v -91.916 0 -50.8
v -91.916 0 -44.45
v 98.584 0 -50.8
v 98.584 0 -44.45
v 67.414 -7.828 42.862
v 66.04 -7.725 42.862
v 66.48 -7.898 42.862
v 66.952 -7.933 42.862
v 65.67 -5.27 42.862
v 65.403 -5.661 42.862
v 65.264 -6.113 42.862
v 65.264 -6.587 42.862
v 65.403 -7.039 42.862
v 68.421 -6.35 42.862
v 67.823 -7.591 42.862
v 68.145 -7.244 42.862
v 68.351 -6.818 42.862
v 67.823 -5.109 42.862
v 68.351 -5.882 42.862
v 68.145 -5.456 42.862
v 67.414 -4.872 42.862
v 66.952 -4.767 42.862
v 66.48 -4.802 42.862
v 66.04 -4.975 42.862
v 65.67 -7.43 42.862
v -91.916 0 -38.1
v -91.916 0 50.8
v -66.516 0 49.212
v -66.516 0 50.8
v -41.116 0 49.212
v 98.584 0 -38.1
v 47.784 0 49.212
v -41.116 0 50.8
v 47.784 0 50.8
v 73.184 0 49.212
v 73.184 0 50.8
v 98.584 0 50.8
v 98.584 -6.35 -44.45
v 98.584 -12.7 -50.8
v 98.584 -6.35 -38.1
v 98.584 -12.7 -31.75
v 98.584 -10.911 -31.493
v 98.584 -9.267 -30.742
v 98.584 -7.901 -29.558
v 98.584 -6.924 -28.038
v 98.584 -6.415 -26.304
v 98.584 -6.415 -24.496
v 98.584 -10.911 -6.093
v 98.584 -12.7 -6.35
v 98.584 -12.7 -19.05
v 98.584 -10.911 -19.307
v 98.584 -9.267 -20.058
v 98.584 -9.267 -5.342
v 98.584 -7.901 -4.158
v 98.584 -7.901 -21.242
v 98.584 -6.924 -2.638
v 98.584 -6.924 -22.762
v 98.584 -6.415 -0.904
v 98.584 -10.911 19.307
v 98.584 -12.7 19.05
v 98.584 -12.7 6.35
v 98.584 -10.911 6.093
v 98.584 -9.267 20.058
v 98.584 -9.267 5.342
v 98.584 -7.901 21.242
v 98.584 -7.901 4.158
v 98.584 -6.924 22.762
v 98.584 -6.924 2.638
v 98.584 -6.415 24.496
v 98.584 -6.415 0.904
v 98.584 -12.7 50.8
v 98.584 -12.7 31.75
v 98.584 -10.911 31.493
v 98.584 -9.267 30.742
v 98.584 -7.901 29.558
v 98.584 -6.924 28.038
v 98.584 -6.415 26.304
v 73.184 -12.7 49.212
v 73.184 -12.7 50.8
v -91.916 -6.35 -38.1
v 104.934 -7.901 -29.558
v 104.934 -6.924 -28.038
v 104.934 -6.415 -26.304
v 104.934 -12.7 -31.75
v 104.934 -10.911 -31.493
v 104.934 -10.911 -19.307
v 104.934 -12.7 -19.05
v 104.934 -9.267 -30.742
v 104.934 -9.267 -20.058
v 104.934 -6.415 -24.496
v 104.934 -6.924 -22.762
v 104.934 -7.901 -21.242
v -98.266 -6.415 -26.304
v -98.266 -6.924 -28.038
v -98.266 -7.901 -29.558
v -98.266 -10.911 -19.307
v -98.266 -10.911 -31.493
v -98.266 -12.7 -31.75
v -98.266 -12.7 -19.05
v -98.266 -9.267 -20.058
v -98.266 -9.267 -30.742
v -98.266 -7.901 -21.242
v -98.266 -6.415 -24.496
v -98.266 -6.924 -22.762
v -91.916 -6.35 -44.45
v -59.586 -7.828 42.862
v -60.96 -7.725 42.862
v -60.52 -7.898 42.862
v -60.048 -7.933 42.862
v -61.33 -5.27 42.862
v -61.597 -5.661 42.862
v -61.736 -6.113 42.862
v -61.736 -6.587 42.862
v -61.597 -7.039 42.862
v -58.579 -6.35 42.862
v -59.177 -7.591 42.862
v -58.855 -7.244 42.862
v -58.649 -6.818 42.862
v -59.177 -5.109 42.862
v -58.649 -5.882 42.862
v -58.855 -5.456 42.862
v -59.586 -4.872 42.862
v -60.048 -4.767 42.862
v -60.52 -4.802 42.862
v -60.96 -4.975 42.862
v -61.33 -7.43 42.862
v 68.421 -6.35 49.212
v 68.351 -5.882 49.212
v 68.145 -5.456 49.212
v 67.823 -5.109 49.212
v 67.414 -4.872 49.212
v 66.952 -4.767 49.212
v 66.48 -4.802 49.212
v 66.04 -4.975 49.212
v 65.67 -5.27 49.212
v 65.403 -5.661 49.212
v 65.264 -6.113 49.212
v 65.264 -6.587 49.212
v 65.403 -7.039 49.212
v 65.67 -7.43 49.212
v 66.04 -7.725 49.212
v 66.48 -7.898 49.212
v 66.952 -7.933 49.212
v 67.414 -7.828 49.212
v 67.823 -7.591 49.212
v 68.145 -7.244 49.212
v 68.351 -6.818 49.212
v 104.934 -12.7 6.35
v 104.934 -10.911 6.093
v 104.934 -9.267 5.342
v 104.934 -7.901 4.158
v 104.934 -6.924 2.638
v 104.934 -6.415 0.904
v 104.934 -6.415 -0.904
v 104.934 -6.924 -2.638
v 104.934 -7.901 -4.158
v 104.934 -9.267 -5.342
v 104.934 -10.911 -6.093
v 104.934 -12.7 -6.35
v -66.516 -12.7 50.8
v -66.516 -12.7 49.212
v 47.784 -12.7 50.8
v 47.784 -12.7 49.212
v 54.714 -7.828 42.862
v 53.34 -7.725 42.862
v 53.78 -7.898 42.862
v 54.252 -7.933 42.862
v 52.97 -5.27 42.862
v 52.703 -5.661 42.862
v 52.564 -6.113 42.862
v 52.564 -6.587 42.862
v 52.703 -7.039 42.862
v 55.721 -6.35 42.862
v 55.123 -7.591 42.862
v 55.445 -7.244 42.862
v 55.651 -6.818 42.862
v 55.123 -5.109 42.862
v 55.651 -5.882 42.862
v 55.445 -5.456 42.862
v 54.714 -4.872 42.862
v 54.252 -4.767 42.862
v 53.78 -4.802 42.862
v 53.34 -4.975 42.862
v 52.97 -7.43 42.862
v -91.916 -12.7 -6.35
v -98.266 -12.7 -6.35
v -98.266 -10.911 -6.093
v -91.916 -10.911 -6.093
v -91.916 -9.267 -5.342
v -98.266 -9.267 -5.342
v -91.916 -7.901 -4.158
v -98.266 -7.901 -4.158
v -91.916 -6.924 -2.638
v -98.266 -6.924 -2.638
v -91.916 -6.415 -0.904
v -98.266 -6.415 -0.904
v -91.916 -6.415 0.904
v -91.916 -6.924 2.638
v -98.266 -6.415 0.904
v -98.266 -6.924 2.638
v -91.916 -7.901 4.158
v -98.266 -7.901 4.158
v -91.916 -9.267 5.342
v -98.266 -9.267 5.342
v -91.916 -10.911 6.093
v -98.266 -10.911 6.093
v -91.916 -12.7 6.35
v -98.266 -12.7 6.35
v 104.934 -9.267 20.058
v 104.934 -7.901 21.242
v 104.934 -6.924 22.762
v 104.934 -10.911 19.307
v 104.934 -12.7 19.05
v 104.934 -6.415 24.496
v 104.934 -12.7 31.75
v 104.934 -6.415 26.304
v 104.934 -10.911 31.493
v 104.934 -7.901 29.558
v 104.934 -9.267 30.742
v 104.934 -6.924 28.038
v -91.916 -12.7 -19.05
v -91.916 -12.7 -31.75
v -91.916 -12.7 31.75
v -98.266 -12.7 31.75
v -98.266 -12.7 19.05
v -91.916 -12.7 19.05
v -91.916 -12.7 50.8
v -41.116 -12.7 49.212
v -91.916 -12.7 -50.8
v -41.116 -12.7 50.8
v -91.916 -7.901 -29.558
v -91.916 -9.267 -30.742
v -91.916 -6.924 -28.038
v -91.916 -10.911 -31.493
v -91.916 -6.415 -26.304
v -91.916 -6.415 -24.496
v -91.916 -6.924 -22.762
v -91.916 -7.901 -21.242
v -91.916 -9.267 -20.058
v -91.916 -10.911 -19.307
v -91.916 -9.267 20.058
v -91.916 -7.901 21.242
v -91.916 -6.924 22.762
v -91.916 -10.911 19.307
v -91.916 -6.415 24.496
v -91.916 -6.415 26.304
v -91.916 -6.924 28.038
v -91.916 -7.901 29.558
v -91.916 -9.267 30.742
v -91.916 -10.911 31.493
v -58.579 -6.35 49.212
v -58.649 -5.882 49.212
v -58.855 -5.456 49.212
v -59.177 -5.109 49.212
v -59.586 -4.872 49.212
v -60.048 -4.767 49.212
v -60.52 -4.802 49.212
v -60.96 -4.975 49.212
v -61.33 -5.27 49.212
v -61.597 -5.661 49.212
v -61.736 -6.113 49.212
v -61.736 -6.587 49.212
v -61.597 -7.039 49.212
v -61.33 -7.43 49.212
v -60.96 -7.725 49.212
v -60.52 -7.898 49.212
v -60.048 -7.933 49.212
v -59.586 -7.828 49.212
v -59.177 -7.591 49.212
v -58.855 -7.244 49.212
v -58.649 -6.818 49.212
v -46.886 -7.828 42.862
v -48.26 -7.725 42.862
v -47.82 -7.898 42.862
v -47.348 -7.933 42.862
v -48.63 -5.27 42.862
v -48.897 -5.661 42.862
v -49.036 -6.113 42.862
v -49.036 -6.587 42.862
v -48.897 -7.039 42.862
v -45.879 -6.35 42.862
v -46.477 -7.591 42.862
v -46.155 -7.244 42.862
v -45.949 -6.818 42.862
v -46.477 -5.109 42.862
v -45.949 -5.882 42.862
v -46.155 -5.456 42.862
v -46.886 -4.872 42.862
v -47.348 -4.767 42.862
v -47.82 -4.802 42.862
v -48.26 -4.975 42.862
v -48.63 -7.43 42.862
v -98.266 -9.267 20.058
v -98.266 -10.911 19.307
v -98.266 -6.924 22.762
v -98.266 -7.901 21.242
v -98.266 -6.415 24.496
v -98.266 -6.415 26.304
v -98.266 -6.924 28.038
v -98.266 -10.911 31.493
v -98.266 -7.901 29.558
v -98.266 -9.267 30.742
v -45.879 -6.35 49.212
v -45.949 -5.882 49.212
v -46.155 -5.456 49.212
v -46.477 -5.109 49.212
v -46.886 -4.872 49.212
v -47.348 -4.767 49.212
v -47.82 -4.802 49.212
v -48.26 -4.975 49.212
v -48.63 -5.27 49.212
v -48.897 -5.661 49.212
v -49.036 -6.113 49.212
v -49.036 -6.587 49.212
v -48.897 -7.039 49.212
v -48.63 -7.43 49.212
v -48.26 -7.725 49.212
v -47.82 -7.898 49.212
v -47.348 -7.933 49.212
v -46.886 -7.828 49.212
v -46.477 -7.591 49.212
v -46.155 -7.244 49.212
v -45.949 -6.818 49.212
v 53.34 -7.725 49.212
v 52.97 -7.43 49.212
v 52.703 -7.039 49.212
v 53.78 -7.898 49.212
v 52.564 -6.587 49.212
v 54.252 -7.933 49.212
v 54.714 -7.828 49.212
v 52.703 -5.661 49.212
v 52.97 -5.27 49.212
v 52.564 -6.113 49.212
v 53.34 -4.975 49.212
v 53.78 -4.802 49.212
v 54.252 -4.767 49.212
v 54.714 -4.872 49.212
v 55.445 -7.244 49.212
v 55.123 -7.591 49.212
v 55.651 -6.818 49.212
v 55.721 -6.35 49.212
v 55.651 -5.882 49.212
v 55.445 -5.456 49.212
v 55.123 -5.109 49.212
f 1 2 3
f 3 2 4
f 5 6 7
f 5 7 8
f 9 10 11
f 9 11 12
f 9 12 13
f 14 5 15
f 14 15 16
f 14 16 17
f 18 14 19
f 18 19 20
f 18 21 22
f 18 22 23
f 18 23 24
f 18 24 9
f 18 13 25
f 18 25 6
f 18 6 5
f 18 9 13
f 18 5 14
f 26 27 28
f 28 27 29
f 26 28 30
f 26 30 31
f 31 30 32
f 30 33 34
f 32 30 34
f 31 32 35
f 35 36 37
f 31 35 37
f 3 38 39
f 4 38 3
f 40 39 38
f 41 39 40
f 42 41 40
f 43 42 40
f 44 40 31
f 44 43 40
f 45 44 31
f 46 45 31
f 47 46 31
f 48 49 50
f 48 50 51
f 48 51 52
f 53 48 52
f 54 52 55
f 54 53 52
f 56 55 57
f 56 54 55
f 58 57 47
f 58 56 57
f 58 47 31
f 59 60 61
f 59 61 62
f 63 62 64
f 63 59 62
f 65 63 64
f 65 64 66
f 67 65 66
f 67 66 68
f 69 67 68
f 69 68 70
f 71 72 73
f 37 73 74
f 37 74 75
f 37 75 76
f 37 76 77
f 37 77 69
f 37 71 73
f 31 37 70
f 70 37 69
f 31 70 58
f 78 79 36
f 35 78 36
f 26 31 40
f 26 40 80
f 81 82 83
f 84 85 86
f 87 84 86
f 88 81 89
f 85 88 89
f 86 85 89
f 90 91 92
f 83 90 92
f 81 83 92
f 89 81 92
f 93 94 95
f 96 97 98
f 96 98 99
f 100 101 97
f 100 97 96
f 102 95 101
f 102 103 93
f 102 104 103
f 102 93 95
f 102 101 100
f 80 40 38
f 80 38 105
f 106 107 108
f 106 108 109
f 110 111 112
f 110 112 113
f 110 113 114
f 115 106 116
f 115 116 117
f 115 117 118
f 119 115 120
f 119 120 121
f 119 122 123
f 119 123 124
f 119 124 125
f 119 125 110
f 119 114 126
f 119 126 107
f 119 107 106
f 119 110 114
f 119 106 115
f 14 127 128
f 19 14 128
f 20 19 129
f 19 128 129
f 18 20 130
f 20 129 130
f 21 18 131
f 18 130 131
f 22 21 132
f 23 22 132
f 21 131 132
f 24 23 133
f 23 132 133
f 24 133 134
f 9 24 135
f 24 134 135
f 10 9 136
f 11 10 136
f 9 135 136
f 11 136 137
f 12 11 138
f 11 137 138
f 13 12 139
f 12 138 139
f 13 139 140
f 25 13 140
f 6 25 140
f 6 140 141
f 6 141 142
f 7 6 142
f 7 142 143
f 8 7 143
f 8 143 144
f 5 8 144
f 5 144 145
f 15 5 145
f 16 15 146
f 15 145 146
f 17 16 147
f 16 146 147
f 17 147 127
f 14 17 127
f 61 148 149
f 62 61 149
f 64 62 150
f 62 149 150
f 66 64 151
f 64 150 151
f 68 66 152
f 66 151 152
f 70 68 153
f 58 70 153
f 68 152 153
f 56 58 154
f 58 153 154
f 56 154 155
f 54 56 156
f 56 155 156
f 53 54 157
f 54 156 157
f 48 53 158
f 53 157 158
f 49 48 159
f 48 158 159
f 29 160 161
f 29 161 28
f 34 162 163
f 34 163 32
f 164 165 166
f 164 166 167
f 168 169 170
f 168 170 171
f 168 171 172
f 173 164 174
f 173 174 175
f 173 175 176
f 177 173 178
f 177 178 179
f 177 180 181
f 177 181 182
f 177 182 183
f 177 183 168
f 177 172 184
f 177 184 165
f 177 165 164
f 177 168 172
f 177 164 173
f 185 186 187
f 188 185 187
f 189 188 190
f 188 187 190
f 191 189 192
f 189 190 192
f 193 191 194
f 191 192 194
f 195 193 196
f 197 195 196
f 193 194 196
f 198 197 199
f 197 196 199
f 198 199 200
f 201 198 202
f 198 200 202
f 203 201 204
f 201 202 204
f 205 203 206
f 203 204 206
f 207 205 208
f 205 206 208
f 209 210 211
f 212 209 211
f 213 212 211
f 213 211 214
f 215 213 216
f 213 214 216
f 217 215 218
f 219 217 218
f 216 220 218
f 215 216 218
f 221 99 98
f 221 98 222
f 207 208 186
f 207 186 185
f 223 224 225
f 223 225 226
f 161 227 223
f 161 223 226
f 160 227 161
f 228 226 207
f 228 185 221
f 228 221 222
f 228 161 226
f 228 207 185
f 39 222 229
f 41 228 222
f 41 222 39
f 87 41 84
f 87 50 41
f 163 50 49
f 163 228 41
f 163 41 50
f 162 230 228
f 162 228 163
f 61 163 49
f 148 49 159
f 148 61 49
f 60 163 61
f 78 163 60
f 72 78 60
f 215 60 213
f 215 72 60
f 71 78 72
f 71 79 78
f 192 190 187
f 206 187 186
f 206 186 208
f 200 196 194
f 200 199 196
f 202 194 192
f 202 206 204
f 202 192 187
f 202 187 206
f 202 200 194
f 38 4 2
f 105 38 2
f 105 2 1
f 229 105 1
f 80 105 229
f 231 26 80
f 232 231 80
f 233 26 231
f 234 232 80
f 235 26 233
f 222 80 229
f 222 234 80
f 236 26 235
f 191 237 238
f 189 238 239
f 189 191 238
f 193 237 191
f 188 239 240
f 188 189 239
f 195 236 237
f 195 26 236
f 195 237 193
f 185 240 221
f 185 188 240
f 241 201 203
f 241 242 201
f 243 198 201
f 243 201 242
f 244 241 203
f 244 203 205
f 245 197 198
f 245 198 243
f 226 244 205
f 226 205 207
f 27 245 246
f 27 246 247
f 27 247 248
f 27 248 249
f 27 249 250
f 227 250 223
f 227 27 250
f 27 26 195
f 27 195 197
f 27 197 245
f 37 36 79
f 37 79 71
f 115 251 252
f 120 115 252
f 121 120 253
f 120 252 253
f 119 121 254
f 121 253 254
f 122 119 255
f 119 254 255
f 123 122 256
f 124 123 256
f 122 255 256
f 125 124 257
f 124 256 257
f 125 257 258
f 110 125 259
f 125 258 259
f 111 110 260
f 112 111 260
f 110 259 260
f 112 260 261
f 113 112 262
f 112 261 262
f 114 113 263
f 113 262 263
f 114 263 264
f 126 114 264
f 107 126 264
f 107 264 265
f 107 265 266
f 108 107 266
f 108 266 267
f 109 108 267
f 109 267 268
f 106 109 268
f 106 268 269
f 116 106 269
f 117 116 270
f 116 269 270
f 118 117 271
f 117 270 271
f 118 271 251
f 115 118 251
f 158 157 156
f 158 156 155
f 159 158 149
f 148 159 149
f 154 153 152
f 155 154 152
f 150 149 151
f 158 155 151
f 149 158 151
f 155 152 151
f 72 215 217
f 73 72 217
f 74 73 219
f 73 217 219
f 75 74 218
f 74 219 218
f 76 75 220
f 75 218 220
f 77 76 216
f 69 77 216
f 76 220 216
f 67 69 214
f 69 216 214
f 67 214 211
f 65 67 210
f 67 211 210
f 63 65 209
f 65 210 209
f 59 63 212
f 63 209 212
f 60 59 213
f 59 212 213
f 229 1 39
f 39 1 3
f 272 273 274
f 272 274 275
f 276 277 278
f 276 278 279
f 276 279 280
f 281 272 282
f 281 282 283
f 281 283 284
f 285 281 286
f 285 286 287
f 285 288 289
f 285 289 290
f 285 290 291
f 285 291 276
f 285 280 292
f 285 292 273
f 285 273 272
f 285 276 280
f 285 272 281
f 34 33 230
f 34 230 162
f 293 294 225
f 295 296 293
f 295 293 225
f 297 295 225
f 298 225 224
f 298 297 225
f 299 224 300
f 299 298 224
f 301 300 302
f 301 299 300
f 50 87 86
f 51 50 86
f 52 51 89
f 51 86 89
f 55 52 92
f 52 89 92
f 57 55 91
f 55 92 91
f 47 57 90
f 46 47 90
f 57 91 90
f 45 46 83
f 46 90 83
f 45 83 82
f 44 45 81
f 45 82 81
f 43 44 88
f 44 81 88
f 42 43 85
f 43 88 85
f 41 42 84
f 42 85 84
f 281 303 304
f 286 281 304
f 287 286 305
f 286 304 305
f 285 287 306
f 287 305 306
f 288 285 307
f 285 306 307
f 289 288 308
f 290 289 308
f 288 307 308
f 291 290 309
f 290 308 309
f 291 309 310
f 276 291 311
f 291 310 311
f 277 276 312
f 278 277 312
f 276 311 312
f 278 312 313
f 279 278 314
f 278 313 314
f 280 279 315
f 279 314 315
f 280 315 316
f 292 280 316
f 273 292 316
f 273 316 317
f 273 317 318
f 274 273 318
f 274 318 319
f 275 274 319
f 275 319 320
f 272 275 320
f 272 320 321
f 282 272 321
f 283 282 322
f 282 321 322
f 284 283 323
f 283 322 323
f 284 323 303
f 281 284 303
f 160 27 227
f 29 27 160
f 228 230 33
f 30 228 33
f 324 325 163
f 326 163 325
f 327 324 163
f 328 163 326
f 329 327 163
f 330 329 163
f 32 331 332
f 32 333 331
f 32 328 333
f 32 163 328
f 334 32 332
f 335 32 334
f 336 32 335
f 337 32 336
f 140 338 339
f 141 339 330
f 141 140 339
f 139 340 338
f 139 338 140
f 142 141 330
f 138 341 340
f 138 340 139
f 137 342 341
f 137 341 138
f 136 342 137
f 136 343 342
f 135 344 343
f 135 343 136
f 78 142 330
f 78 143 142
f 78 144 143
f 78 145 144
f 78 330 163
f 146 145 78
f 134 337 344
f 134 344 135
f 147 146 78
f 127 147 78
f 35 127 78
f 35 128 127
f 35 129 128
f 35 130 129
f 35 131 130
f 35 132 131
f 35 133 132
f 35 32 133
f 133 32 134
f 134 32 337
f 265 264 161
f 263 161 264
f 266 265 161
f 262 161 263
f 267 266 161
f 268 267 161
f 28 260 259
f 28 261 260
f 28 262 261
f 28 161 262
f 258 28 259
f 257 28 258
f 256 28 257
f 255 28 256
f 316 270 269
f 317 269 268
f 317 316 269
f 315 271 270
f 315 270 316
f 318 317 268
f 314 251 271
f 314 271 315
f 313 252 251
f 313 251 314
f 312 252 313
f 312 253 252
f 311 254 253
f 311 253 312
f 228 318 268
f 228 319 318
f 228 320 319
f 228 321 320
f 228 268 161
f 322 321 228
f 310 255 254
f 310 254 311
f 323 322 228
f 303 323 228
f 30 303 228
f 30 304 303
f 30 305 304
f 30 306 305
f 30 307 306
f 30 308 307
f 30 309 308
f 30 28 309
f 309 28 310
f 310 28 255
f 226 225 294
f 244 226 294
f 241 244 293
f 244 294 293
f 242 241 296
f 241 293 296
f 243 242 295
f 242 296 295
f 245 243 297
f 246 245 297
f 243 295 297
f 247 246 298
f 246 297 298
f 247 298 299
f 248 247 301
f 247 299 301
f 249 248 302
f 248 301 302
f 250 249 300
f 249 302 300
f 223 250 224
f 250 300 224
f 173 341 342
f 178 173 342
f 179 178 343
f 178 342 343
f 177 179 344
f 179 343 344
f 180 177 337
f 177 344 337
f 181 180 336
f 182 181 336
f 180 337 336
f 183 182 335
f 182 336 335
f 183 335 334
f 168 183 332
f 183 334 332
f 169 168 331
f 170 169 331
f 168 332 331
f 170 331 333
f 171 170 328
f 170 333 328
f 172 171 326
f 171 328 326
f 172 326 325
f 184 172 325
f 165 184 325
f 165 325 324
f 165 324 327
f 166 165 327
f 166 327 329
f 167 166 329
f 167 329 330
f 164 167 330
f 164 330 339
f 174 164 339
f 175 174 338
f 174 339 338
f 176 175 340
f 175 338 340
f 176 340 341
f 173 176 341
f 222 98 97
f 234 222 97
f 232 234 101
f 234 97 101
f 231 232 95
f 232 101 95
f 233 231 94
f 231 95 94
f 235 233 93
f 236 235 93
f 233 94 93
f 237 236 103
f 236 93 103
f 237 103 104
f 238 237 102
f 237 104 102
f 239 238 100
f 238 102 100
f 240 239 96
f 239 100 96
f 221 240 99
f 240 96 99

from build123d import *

# Parameters (mm, degrees)
F0_W      = 203.2
F0_H      = 101.6
F1_DEPTH  = 12.7
F2_W      = 203.2
F2_H      = 6.35
F3_DEPTH  = 6.35
F5_DEPTH  = 6.35
F7_DEPTH  = 6.35
F8_W      = 25.4
F8_H      = 12.7
F9_DEPTH  = 1.5875
F10_R     = 1.5875
F11_DEPTH = 6.35
F12_R     = 1.5875
F13_DEPTH = 6.35


with BuildPart() as f1:
    # F0 (on Front) → F1 (new body)
    with BuildSketch(Plane.XZ):
        with Locations((3.333623, 0)):
            Rectangle(F0_W, F0_H)
    extrude(amount=F1_DEPTH)

    # F2 (on face) → F3 (cut)
    with BuildSketch(Plane(origin=(0, 0, 0), x_dir=(-1, 0, 0), z_dir=(0, 1, 0))):
        with Locations((-3.333623, -41.275)):
            Rectangle(F2_W, F2_H)
    extrude(amount=-F3_DEPTH, mode=Mode.SUBTRACT)

    # F4 (on face) → F5 (cut)
    with BuildSketch(Plane(origin=(-98.266377, 0, 0), x_dir=(0, -1, 0), z_dir=(-1, 0, 0))):
        with BuildLine():
            ThreePointArc((12.7, 19.05), (6.35, 25.4), (12.7, 31.75))
            Line((12.7, 31.75), (12.7, 50.8))
            Line((12.7, 50.8), (0, 50.8))
            Line((0, 50.8), (0, -38.1))
            Line((0, -38.1), (6.35, -38.1))
            Line((6.35, -38.1), (6.35, -44.45))
            Line((6.35, -44.45), (0, -44.45))
            Line((0, -44.45), (0, -50.8))
            Line((0, -50.8), (12.7, -50.8))
            Line((12.7, -50.8), (12.7, -31.75))
            ThreePointArc((12.7, -31.75), (6.35, -25.4), (12.7, -19.05))
            Line((12.7, -19.05), (12.7, -6.35))
            ThreePointArc((12.7, -6.35), (6.35, 0), (12.7, 6.35))
            Line((12.7, 6.35), (12.7, 19.05))
        make_face()
    extrude(amount=-F5_DEPTH, mode=Mode.SUBTRACT)

    # F6 (on face) → F7 (cut)
    with BuildSketch(Plane.YZ.offset(104.933623)):
        with BuildLine():
            ThreePointArc((-12.7, 31.75), (-6.35, 25.4), (-12.7, 19.05))
            Line((-12.7, 19.05), (-12.7, 6.35))
            ThreePointArc((-12.7, 6.35), (-6.35, 0), (-12.7, -6.35))
            Line((-12.7, -6.35), (-12.7, -19.05))
            ThreePointArc((-12.7, -19.05), (-6.35, -25.4), (-12.7, -31.75))
            Line((-12.7, -31.75), (-12.7, -50.8))
            Line((-12.7, -50.8), (0, -50.8))
            Line((0, -50.8), (0, -44.45))
            Line((0, -44.45), (-6.35, -44.45))
            Line((-6.35, -44.45), (-6.35, -38.1))
            Line((-6.35, -38.1), (0, -38.1))
            Line((0, -38.1), (0, 50.8))
            Line((0, 50.8), (-12.7, 50.8))
            Line((-12.7, 50.8), (-12.7, 31.75))
        make_face()
    extrude(amount=-F7_DEPTH, mode=Mode.SUBTRACT)

    # F8 (on face) → F9 (cut)
    with BuildSketch(Plane.XY.offset(50.8)):
        with Locations((-53.816377, -6.35)):
            Rectangle(F8_W, F8_H)
        with Locations((60.483623, -6.35)):
            Rectangle(F8_W, F8_H)
    extrude(amount=-F9_DEPTH, mode=Mode.SUBTRACT)

    # F10 (on face) → F11 (cut)
    with BuildSketch(Plane.XY.offset(49.2125)):
        with Locations((-60.166377, -6.35)):
            Circle(F10_R)
        with Locations((-47.466377, -6.35)):
            Circle(F10_R)
    extrude(amount=-F11_DEPTH, mode=Mode.SUBTRACT)

    # F12 (on face) → F13 (cut)
    with BuildSketch(Plane.XY.offset(49.2125)):
        with Locations((54.133623, -6.35)):
            Circle(F12_R)
        with Locations((66.833623, -6.35)):
            Circle(F12_R)
    extrude(amount=-F13_DEPTH, mode=Mode.SUBTRACT)


solid = f1.part
